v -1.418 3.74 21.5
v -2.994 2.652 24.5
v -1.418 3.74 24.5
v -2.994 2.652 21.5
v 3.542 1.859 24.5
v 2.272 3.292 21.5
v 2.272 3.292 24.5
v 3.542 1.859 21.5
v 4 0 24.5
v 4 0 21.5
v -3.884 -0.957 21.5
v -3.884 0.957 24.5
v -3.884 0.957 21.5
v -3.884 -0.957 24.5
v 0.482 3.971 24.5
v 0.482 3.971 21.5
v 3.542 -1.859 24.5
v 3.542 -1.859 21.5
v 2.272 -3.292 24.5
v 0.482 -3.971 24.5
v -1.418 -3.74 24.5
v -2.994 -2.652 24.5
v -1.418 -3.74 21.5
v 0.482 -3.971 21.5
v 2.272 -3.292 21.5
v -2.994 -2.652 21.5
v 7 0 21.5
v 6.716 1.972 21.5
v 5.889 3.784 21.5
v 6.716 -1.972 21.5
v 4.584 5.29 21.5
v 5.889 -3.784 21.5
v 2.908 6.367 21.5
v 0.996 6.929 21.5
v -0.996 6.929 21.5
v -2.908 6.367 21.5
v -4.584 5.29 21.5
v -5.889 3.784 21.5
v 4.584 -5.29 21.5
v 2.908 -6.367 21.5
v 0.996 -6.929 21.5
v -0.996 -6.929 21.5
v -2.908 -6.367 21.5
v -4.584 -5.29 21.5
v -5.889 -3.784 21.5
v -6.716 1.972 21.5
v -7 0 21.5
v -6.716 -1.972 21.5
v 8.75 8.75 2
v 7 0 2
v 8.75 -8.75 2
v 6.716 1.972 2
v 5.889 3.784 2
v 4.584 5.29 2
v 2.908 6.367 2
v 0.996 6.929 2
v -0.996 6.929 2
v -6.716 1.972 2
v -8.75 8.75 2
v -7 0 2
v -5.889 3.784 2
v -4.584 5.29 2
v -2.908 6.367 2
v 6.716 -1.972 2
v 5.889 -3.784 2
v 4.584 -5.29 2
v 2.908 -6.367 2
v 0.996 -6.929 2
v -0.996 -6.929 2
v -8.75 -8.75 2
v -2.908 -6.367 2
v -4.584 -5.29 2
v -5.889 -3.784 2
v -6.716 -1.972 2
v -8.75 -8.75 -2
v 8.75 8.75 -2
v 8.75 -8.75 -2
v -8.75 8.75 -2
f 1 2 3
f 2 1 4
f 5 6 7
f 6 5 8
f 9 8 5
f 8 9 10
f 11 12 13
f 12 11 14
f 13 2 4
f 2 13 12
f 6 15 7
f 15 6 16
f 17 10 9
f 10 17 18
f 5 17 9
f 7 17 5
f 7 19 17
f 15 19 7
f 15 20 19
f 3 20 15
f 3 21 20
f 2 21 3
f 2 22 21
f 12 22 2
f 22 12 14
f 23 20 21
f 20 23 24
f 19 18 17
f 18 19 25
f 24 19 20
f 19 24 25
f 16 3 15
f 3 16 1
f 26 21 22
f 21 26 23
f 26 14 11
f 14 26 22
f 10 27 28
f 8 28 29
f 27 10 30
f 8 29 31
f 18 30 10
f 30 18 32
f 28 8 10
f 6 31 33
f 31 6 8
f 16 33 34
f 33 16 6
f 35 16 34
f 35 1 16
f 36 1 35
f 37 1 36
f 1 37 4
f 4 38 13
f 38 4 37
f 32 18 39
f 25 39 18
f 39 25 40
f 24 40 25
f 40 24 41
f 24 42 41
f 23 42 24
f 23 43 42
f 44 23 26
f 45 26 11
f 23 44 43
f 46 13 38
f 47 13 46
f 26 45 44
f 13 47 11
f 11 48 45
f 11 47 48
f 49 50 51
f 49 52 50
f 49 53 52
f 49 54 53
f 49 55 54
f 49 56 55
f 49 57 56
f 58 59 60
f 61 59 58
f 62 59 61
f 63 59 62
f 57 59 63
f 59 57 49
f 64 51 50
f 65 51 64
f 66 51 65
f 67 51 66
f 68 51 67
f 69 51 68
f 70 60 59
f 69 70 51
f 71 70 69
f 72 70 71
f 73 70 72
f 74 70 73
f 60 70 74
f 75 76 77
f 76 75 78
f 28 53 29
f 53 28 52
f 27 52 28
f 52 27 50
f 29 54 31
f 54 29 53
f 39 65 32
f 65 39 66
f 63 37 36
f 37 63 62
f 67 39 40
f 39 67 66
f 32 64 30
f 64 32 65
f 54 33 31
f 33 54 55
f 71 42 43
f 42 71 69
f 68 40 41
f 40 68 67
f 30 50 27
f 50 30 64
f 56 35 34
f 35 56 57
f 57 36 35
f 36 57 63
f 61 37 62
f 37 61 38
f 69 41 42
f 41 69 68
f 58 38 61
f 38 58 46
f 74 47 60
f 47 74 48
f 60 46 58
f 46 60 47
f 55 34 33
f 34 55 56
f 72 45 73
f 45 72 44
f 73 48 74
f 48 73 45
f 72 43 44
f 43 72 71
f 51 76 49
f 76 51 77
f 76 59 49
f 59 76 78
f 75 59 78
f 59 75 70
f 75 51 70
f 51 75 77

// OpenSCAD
w = 35/2;  //screw distance
rl=17.5; // rod length
t =2;
module screws(){
for (i=[[-w,-w],[w,-w],[w,w],[-w,w]]){
    translate(concat(i,5))
    cylinder(d=5,h=10,center=true);
}
}


module rod(){
translate([0,0,rl/2+4]){
%cylinder(d=6,h=rl,center=true,$fn=30); //rod
translate([0,0,rl/2])cylinder(d=8,h=3);  //magnet
translate([0,0,-rl/2-4])cylinder(d=4.8,h=4,$fn=20); //silicone plug
}
}

rod();

difference(){
union(){
cube([w+t+t,w+t+t,4],true);
 //translate([0,0,-8])sphere(r=w);
    translate([0,0,(rl+4)/2])cylinder(d=14,h=rl+4,center=true);
    translate([0,0,(rl+4)/2])cylinder(d=14,h=rl+4,center=true);
}

for(e=[0:90:359]){
    rotate([0,0,e])
        translate([w+w,0,0]*1.25)
            cube(4*w,center=true);
}
//translate([0,0,-w])cube(2*w,true);
}
